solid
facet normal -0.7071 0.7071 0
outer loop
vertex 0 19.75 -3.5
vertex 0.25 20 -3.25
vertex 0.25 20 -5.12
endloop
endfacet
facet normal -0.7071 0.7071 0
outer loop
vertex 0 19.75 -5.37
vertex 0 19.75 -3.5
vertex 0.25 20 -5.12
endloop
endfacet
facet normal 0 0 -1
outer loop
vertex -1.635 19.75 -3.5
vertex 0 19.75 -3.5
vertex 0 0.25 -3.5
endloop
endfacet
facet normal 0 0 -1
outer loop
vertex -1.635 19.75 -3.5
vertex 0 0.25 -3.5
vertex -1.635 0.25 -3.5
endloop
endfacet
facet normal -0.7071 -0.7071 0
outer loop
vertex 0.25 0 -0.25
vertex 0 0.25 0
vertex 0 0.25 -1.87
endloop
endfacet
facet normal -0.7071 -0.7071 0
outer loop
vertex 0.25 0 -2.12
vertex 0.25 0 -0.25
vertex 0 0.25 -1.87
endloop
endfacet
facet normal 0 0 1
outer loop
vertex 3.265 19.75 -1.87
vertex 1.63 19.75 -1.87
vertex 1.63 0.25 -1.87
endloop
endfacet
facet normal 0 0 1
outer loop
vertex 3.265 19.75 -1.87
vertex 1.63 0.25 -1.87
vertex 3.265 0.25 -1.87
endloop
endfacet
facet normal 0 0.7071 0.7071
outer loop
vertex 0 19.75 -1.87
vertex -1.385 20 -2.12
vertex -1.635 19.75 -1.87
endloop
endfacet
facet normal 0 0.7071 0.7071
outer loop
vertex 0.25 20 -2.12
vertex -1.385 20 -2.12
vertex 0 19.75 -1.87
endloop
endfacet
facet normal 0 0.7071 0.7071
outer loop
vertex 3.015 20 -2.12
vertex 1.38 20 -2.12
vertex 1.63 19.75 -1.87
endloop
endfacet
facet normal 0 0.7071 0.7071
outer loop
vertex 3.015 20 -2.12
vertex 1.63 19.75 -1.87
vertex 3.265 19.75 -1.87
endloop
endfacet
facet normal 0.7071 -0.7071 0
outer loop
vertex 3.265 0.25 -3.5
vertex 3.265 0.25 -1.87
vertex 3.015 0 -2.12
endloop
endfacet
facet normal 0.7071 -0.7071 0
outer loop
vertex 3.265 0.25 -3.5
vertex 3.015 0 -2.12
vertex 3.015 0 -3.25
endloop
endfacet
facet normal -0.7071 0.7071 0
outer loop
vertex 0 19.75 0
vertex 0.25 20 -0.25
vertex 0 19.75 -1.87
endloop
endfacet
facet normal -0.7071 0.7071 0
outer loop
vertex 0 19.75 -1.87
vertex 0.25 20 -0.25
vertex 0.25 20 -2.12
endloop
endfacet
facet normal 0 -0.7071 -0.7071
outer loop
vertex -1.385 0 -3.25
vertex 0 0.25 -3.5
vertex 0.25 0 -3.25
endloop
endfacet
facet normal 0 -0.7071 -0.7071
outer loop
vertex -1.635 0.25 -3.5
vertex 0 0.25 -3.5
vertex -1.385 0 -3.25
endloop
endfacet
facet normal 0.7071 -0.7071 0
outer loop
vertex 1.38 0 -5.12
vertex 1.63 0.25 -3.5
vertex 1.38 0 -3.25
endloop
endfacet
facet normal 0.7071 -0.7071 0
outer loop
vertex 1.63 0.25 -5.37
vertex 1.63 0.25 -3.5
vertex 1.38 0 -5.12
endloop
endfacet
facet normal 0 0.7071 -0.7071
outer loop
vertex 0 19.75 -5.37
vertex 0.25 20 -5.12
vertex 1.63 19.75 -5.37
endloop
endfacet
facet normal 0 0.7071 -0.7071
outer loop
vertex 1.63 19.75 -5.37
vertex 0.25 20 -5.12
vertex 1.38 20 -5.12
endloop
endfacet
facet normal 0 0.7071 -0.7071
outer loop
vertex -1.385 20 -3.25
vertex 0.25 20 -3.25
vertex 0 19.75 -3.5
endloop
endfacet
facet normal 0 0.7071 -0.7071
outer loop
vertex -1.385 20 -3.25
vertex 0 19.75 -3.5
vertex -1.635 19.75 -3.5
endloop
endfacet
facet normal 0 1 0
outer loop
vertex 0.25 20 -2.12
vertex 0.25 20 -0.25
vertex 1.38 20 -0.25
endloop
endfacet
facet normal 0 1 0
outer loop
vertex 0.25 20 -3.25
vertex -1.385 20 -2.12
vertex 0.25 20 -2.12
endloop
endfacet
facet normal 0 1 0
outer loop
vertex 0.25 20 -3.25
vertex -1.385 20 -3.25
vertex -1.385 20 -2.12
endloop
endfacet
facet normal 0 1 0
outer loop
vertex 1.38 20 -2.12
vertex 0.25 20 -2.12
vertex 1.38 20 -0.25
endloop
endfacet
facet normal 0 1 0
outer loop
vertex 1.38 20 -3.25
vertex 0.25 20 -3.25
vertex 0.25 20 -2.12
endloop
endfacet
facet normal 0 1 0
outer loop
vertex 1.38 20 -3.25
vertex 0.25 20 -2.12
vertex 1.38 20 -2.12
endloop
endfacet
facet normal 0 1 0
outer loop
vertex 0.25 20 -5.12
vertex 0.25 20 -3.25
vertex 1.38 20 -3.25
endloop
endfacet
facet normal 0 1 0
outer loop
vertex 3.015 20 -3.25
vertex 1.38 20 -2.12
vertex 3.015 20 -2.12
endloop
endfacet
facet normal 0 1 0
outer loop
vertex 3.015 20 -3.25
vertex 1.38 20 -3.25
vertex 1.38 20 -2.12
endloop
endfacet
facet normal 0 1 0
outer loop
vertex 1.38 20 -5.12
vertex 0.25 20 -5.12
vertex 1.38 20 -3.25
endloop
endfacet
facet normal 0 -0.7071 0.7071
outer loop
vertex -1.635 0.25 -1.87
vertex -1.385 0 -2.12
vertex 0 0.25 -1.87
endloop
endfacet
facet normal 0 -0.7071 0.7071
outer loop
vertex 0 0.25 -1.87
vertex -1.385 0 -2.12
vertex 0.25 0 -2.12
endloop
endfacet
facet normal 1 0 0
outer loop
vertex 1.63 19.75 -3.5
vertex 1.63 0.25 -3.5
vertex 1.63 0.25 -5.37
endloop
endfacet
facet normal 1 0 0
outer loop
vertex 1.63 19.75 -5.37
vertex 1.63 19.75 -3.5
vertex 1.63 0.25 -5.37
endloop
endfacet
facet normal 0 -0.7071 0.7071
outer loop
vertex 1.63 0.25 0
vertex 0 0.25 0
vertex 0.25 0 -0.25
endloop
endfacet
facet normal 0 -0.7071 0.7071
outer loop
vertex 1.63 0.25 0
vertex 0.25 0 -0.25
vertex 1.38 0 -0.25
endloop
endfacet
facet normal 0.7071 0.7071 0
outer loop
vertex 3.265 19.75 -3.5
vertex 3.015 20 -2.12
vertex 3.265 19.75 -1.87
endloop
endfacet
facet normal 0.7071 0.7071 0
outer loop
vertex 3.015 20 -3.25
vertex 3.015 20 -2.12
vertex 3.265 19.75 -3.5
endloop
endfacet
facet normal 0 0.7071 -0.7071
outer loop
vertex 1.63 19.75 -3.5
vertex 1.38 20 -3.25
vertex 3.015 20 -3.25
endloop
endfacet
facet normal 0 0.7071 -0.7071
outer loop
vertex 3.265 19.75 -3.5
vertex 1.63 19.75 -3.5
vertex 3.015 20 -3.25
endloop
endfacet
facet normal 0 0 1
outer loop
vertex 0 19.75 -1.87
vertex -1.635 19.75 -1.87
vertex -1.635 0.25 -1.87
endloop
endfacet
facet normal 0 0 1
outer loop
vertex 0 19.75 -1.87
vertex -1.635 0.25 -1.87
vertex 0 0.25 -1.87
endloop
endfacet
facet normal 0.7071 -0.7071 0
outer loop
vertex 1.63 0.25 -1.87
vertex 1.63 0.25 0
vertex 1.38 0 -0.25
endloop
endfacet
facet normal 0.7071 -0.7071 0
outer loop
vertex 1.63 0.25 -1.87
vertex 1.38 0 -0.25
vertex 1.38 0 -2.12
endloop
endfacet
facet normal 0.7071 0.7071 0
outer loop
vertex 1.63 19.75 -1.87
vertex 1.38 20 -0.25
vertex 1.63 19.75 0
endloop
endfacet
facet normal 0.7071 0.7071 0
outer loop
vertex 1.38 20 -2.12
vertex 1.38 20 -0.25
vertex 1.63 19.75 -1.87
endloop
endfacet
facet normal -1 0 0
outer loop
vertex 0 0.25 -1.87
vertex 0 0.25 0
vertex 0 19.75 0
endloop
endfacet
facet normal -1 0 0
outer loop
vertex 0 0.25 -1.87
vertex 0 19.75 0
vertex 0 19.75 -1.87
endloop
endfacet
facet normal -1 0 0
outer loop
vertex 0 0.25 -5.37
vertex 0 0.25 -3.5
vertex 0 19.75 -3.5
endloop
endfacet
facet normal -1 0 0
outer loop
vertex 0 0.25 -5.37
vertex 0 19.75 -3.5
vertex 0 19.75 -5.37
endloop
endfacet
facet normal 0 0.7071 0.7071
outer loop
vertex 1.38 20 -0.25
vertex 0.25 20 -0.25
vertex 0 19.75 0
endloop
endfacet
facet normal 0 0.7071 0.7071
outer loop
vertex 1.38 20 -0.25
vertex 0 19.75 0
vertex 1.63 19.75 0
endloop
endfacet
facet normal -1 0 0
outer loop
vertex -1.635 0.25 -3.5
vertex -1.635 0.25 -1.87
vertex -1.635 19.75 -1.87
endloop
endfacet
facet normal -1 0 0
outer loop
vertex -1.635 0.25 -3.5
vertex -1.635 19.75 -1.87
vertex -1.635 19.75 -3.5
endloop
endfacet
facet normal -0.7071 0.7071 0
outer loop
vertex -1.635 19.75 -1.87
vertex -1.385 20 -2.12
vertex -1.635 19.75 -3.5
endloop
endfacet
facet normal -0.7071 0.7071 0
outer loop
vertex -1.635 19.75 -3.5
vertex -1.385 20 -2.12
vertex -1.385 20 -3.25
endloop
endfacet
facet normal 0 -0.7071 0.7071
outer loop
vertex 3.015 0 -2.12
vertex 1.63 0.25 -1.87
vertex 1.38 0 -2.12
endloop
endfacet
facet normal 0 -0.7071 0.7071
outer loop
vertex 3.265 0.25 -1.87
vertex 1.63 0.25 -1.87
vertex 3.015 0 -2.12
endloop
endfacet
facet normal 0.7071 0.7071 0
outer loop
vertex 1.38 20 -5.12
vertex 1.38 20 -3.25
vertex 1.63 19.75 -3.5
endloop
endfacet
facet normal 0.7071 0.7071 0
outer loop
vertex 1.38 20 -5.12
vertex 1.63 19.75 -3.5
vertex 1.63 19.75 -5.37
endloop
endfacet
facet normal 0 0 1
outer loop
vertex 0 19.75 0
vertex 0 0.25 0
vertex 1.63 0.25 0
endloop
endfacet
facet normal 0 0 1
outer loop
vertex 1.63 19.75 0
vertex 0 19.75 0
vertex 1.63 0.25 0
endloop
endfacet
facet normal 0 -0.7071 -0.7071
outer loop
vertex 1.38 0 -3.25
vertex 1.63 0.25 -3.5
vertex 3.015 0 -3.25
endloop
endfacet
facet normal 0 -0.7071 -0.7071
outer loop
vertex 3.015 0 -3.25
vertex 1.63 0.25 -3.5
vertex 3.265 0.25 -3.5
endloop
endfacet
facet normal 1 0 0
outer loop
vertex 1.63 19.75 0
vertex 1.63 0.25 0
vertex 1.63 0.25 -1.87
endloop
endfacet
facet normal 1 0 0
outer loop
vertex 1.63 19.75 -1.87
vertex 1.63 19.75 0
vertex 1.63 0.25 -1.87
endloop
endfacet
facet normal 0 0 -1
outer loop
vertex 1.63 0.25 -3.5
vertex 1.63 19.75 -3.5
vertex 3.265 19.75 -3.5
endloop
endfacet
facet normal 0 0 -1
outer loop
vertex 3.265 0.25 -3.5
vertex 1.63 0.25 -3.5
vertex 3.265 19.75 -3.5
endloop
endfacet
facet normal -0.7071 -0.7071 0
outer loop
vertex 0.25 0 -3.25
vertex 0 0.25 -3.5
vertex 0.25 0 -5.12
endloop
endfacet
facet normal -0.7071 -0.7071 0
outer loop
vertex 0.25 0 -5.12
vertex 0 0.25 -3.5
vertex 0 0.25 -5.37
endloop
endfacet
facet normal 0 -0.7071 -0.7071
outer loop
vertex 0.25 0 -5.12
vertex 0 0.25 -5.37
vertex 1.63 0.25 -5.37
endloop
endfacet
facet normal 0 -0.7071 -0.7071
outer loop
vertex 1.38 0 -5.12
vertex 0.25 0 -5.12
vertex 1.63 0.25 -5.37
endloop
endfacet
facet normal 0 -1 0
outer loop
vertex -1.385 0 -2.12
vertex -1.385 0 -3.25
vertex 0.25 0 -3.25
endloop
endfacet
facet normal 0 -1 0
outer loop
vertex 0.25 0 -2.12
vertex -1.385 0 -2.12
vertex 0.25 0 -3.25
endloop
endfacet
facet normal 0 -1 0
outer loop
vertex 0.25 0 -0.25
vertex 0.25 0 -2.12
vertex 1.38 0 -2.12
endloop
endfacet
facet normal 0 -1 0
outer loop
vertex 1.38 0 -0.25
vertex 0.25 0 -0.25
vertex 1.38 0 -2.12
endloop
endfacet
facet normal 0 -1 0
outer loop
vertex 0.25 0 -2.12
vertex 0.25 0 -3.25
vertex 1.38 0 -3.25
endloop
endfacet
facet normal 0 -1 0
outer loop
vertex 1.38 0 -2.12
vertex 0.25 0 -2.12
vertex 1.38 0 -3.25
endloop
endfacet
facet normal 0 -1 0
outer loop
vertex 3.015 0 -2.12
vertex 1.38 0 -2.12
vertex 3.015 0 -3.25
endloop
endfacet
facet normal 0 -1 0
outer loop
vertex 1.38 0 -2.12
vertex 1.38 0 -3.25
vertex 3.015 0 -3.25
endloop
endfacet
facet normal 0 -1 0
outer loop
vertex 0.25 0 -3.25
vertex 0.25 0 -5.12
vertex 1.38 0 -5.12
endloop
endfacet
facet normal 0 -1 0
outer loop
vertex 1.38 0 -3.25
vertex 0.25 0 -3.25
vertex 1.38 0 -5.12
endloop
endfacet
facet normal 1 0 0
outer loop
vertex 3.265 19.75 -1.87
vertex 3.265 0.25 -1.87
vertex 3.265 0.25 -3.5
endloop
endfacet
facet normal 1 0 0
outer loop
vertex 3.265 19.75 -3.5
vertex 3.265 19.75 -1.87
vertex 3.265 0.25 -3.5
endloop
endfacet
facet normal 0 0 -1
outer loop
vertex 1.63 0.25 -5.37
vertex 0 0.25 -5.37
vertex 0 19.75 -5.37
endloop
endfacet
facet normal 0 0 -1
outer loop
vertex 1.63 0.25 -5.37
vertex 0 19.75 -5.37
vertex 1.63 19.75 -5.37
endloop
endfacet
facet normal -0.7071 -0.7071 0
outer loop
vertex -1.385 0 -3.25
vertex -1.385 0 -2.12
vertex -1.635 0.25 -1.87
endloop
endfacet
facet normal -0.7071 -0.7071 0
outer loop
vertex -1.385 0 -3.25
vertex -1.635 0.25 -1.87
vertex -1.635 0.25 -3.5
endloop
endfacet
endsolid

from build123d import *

# Parameters (mm, degrees)
SKETCH1_W           = 1.635
SKETCH1_H           = 1.63
SKETCH1_W_2         = 1.63
SKETCH1_H_2         = 1.87
BOSS_EXTRUDE1_DEPTH = 20
CHAMFER1_SIZE       = 0.25
CHAMFER2_SIZE       = 0.25


with BuildPart() as part:
    # Sketch1 → Boss-Extrude1 (new body)
    with BuildSketch(Plane(origin=(0, 0, 0), x_dir=(1, 0, 0), z_dir=(0, 1, 0))):
        with Locations((-0.8175, 2.685)):
            Rectangle(SKETCH1_W, SKETCH1_H)
        with Locations((0.815, 2.685)):
            Rectangle(SKETCH1_W_2, SKETCH1_H)
        with Locations((0.815, 4.435)):
            Rectangle(SKETCH1_W_2, SKETCH1_H_2)
        with Locations((2.4475, 2.685)):
            Rectangle(SKETCH1_W, SKETCH1_H)
        with Locations((0.815, 0.935)):
            Rectangle(SKETCH1_W_2, SKETCH1_H_2)
    extrude(amount=BOSS_EXTRUDE1_DEPTH)

    # Chamfer1
    chamfer1_edges = [part.edges().sort_by_distance(p)[0] for p in [
        (-0.8175, 20, -1.87),
        (0, 20, -0.935),
        (0.815, 20, 0),
        (1.63, 20, -0.935),
        (2.4475, 20, -1.87),
        (3.265, 20, -2.685),
        (2.4475, 20, -3.5),
        (1.63, 20, -4.435),
        (-1.635, 20, -2.685),
        (0.815, 20, -5.37),
        (0, 20, -4.435),
        (-0.8175, 20, -3.5),
    ]]
    chamfer(chamfer1_edges, length=CHAMFER1_SIZE)

    # Chamfer2
    chamfer2_edges = [part.edges().sort_by_distance(p)[0] for p in [
        (-0.8175, 0, -3.5),
        (0, 0, -4.435),
        (0.815, 0, -5.37),
        (1.63, 0, -4.435),
        (2.4475, 0, -3.5),
        (3.265, 0, -2.685),
        (2.4475, 0, -1.87),
        (1.63, 0, -0.935),
        (0.815, 0, 0),
        (0, 0, -0.935),
        (-0.8175, 0, -1.87),
        (-1.635, 0, -2.685),
    ]]
    chamfer(chamfer2_edges, length=CHAMFER2_SIZE)


solid = part.part
